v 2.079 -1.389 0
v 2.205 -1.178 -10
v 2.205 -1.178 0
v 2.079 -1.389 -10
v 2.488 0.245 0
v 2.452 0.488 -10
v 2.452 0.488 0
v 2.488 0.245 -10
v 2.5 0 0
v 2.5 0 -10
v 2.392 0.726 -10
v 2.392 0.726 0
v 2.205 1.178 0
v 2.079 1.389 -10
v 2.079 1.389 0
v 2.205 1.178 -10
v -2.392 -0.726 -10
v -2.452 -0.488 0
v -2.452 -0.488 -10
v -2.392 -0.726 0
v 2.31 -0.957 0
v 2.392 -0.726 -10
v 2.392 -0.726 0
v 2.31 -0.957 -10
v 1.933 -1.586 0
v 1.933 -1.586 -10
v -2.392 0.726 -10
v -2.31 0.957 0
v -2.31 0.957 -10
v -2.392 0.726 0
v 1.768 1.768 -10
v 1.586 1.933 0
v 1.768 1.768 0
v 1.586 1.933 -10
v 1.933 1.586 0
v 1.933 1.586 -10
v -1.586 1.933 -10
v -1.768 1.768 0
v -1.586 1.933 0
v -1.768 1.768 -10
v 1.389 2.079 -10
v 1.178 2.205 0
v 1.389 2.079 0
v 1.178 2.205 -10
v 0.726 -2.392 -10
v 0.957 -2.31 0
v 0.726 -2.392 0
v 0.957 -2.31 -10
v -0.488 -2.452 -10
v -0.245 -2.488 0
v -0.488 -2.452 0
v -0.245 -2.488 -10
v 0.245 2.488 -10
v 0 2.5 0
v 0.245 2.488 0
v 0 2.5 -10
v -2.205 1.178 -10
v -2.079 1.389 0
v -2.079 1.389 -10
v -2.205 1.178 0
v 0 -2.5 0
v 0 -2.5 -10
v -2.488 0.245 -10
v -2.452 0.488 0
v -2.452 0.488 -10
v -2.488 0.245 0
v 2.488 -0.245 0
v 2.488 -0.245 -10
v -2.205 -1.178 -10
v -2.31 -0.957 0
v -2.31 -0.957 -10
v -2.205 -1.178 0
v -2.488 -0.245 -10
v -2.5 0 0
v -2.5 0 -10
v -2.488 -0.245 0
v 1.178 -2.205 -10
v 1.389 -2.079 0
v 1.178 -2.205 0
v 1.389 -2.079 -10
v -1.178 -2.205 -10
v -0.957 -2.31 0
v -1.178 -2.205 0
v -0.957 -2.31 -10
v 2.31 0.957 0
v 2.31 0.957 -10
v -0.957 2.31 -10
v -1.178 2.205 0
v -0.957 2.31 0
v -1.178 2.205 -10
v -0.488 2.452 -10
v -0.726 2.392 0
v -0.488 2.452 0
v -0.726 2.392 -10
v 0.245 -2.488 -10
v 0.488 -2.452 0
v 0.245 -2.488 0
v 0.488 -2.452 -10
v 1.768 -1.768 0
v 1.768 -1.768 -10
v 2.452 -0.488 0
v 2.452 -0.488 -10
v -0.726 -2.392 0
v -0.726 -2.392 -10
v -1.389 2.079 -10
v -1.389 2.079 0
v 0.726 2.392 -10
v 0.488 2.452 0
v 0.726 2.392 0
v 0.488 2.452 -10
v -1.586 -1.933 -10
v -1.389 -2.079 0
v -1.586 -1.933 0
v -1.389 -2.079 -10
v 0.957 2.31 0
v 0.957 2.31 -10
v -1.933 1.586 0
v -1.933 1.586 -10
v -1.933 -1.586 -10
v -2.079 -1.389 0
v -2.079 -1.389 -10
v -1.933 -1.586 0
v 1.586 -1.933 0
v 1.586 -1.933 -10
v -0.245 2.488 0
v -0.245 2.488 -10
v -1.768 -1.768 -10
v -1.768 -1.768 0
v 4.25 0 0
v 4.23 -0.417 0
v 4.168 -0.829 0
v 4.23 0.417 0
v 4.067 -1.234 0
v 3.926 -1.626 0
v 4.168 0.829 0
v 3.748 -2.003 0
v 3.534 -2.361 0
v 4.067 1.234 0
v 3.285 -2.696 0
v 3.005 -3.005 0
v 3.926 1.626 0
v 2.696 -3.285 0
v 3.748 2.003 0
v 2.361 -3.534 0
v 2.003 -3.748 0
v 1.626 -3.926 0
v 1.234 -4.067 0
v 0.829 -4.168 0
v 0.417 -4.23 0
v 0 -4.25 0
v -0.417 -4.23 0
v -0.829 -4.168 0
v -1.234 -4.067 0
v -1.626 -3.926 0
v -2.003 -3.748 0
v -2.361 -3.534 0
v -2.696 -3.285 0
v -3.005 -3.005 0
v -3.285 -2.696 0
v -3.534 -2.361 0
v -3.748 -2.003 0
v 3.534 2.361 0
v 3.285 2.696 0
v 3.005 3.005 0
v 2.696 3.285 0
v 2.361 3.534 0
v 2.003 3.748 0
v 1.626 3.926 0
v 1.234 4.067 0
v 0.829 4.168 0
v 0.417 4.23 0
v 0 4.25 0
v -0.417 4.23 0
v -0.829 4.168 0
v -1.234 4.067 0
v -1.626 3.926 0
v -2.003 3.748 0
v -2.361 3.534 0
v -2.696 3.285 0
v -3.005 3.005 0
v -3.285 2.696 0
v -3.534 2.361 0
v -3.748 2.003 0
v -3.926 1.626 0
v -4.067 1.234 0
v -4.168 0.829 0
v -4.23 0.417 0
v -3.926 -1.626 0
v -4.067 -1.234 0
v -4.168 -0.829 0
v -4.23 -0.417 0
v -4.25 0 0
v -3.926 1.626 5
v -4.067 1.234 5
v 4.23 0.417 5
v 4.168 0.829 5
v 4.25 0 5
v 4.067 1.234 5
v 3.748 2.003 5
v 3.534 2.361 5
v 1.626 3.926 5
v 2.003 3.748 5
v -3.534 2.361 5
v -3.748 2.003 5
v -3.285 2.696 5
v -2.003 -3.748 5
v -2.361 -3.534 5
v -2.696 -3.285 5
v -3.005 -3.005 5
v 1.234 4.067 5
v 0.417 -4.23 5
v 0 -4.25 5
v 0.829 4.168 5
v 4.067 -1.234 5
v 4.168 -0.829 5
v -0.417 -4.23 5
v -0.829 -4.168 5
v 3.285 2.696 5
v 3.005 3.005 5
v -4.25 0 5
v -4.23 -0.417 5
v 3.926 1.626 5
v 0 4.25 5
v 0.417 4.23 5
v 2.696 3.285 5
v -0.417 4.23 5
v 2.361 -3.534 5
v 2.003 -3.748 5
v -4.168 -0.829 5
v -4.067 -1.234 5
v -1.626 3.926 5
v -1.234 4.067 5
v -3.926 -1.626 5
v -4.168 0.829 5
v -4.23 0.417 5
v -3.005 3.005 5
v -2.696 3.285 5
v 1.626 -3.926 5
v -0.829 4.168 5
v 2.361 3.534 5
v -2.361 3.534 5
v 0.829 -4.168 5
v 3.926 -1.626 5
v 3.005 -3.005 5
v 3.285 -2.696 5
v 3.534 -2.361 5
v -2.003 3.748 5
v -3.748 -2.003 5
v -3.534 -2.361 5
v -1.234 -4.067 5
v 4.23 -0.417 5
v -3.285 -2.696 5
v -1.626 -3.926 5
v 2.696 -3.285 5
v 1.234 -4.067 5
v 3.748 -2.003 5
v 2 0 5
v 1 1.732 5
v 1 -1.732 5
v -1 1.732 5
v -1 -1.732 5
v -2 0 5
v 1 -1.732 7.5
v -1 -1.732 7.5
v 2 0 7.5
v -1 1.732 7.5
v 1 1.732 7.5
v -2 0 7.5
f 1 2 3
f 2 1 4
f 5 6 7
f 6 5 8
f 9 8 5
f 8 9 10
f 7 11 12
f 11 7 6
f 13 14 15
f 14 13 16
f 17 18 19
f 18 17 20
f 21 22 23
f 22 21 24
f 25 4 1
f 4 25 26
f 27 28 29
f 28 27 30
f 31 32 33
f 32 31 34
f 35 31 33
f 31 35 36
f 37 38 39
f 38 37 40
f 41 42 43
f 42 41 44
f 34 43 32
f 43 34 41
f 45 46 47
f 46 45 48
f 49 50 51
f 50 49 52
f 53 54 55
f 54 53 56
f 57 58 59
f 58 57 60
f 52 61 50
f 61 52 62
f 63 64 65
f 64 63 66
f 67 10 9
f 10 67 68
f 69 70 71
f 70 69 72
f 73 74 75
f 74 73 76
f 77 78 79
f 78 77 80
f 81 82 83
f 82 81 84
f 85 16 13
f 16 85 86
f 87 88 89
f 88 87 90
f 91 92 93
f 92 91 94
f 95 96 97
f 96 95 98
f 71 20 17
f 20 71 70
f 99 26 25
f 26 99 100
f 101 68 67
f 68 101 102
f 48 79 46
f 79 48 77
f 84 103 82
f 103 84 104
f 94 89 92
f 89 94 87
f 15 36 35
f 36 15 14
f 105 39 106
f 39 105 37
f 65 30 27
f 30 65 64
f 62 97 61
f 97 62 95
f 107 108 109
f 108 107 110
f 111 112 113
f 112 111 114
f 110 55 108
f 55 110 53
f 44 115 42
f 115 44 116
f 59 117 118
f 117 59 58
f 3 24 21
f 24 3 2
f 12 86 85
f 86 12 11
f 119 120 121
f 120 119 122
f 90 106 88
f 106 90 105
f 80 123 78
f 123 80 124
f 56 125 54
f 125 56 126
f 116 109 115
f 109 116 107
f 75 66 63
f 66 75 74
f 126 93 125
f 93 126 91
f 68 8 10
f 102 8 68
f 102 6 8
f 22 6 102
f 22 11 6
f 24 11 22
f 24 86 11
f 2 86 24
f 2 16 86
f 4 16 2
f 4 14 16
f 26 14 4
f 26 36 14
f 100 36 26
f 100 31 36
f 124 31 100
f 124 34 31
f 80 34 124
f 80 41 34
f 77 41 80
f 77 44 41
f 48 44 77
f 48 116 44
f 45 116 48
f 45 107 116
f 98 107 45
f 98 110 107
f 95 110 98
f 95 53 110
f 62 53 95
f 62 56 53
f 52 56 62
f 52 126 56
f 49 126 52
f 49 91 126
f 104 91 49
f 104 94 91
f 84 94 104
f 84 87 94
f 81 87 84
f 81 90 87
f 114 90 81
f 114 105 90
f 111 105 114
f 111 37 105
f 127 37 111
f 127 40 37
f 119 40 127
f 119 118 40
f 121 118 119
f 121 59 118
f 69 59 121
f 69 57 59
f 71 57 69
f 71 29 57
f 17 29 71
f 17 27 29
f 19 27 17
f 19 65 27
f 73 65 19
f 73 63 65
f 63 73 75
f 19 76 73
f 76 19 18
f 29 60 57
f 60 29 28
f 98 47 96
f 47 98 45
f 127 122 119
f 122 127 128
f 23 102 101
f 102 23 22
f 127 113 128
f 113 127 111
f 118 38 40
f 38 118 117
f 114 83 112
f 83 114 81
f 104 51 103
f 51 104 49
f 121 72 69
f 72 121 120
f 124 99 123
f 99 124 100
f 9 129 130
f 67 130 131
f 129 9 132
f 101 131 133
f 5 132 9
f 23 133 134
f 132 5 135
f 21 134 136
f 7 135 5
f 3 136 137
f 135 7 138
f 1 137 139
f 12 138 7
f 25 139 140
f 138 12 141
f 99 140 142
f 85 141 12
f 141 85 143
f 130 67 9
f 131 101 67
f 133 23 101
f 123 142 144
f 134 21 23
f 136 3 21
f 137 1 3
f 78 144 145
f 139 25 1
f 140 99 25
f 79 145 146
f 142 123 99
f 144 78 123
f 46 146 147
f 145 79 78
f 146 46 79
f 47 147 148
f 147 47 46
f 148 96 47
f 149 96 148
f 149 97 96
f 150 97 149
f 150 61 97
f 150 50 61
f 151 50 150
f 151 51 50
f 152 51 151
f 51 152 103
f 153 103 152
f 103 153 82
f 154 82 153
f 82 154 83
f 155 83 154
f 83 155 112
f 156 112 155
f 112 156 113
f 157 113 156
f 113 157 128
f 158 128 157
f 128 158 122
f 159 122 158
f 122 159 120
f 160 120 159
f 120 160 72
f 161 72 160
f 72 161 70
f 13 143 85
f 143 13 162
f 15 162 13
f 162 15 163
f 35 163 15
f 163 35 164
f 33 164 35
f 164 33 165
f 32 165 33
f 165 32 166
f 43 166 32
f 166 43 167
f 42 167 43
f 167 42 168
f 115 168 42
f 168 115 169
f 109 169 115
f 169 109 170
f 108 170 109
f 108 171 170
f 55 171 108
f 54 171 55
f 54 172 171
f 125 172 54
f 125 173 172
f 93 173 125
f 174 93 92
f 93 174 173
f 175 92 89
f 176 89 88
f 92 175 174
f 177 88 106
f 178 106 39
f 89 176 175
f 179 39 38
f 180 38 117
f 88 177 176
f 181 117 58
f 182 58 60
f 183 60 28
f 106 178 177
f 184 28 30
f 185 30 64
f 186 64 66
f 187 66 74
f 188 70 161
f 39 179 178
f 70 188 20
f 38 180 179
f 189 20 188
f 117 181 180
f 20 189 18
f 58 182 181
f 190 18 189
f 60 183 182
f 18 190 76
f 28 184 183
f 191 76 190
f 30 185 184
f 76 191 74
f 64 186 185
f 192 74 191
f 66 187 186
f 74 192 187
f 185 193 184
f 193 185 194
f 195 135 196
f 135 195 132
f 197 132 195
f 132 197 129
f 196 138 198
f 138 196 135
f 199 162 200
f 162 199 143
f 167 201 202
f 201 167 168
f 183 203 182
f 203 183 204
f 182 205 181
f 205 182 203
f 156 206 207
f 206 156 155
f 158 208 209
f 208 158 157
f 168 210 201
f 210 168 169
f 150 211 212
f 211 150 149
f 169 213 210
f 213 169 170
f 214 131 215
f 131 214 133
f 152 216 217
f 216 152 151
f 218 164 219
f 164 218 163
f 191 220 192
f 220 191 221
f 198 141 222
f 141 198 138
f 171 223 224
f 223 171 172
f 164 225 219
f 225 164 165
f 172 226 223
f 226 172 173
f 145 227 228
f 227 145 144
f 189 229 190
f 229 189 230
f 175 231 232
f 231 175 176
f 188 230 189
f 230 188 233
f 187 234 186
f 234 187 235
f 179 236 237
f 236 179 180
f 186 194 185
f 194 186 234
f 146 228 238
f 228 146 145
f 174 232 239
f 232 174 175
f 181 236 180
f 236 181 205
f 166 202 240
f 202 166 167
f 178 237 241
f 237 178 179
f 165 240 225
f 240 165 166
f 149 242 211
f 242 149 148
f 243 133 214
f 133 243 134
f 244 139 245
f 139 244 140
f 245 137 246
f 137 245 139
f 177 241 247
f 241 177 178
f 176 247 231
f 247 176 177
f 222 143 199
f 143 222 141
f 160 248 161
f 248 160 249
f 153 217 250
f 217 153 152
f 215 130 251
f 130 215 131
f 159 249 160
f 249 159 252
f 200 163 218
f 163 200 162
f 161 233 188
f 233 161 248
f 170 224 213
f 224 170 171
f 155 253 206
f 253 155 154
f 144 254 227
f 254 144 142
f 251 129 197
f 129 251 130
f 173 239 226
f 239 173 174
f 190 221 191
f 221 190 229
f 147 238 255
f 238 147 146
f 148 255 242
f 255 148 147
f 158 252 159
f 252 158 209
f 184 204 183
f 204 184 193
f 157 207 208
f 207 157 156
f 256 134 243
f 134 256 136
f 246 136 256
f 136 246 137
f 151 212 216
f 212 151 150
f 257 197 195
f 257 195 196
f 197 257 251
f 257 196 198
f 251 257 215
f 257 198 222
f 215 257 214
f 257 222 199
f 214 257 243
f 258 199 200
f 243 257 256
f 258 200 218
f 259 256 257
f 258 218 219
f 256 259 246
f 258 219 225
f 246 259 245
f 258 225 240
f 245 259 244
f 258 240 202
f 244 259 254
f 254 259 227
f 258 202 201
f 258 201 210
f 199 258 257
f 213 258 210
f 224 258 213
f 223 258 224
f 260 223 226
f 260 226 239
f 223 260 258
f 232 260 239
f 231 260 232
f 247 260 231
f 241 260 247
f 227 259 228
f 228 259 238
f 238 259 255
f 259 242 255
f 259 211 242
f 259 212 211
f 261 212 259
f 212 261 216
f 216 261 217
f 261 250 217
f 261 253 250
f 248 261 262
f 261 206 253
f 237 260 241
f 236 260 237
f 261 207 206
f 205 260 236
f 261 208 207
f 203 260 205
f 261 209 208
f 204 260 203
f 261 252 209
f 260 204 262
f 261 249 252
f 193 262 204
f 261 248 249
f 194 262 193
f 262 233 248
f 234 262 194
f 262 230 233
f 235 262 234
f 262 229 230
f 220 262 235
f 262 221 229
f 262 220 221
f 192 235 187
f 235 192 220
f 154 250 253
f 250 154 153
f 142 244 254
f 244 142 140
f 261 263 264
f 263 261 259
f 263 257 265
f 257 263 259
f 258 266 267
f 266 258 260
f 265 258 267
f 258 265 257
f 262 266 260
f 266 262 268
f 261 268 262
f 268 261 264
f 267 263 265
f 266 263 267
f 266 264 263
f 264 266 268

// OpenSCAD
module socket_head_cap_screw() {
    union() {
        // Screw shaft
        translate([0, 0, -10])
            cylinder(h=10, d=5, $fn=64);
        
        // Screw head
        translate([0, 0, 0])
            cylinder(h=5, d=8.5, $fn=64);
        
        // Hex socket
        translate([0, 0, 2.5])
            rotate([0, 0, 0])
                cylinder(h=5, d=4, $fn=6);
    }
}

socket_head_cap_screw();
